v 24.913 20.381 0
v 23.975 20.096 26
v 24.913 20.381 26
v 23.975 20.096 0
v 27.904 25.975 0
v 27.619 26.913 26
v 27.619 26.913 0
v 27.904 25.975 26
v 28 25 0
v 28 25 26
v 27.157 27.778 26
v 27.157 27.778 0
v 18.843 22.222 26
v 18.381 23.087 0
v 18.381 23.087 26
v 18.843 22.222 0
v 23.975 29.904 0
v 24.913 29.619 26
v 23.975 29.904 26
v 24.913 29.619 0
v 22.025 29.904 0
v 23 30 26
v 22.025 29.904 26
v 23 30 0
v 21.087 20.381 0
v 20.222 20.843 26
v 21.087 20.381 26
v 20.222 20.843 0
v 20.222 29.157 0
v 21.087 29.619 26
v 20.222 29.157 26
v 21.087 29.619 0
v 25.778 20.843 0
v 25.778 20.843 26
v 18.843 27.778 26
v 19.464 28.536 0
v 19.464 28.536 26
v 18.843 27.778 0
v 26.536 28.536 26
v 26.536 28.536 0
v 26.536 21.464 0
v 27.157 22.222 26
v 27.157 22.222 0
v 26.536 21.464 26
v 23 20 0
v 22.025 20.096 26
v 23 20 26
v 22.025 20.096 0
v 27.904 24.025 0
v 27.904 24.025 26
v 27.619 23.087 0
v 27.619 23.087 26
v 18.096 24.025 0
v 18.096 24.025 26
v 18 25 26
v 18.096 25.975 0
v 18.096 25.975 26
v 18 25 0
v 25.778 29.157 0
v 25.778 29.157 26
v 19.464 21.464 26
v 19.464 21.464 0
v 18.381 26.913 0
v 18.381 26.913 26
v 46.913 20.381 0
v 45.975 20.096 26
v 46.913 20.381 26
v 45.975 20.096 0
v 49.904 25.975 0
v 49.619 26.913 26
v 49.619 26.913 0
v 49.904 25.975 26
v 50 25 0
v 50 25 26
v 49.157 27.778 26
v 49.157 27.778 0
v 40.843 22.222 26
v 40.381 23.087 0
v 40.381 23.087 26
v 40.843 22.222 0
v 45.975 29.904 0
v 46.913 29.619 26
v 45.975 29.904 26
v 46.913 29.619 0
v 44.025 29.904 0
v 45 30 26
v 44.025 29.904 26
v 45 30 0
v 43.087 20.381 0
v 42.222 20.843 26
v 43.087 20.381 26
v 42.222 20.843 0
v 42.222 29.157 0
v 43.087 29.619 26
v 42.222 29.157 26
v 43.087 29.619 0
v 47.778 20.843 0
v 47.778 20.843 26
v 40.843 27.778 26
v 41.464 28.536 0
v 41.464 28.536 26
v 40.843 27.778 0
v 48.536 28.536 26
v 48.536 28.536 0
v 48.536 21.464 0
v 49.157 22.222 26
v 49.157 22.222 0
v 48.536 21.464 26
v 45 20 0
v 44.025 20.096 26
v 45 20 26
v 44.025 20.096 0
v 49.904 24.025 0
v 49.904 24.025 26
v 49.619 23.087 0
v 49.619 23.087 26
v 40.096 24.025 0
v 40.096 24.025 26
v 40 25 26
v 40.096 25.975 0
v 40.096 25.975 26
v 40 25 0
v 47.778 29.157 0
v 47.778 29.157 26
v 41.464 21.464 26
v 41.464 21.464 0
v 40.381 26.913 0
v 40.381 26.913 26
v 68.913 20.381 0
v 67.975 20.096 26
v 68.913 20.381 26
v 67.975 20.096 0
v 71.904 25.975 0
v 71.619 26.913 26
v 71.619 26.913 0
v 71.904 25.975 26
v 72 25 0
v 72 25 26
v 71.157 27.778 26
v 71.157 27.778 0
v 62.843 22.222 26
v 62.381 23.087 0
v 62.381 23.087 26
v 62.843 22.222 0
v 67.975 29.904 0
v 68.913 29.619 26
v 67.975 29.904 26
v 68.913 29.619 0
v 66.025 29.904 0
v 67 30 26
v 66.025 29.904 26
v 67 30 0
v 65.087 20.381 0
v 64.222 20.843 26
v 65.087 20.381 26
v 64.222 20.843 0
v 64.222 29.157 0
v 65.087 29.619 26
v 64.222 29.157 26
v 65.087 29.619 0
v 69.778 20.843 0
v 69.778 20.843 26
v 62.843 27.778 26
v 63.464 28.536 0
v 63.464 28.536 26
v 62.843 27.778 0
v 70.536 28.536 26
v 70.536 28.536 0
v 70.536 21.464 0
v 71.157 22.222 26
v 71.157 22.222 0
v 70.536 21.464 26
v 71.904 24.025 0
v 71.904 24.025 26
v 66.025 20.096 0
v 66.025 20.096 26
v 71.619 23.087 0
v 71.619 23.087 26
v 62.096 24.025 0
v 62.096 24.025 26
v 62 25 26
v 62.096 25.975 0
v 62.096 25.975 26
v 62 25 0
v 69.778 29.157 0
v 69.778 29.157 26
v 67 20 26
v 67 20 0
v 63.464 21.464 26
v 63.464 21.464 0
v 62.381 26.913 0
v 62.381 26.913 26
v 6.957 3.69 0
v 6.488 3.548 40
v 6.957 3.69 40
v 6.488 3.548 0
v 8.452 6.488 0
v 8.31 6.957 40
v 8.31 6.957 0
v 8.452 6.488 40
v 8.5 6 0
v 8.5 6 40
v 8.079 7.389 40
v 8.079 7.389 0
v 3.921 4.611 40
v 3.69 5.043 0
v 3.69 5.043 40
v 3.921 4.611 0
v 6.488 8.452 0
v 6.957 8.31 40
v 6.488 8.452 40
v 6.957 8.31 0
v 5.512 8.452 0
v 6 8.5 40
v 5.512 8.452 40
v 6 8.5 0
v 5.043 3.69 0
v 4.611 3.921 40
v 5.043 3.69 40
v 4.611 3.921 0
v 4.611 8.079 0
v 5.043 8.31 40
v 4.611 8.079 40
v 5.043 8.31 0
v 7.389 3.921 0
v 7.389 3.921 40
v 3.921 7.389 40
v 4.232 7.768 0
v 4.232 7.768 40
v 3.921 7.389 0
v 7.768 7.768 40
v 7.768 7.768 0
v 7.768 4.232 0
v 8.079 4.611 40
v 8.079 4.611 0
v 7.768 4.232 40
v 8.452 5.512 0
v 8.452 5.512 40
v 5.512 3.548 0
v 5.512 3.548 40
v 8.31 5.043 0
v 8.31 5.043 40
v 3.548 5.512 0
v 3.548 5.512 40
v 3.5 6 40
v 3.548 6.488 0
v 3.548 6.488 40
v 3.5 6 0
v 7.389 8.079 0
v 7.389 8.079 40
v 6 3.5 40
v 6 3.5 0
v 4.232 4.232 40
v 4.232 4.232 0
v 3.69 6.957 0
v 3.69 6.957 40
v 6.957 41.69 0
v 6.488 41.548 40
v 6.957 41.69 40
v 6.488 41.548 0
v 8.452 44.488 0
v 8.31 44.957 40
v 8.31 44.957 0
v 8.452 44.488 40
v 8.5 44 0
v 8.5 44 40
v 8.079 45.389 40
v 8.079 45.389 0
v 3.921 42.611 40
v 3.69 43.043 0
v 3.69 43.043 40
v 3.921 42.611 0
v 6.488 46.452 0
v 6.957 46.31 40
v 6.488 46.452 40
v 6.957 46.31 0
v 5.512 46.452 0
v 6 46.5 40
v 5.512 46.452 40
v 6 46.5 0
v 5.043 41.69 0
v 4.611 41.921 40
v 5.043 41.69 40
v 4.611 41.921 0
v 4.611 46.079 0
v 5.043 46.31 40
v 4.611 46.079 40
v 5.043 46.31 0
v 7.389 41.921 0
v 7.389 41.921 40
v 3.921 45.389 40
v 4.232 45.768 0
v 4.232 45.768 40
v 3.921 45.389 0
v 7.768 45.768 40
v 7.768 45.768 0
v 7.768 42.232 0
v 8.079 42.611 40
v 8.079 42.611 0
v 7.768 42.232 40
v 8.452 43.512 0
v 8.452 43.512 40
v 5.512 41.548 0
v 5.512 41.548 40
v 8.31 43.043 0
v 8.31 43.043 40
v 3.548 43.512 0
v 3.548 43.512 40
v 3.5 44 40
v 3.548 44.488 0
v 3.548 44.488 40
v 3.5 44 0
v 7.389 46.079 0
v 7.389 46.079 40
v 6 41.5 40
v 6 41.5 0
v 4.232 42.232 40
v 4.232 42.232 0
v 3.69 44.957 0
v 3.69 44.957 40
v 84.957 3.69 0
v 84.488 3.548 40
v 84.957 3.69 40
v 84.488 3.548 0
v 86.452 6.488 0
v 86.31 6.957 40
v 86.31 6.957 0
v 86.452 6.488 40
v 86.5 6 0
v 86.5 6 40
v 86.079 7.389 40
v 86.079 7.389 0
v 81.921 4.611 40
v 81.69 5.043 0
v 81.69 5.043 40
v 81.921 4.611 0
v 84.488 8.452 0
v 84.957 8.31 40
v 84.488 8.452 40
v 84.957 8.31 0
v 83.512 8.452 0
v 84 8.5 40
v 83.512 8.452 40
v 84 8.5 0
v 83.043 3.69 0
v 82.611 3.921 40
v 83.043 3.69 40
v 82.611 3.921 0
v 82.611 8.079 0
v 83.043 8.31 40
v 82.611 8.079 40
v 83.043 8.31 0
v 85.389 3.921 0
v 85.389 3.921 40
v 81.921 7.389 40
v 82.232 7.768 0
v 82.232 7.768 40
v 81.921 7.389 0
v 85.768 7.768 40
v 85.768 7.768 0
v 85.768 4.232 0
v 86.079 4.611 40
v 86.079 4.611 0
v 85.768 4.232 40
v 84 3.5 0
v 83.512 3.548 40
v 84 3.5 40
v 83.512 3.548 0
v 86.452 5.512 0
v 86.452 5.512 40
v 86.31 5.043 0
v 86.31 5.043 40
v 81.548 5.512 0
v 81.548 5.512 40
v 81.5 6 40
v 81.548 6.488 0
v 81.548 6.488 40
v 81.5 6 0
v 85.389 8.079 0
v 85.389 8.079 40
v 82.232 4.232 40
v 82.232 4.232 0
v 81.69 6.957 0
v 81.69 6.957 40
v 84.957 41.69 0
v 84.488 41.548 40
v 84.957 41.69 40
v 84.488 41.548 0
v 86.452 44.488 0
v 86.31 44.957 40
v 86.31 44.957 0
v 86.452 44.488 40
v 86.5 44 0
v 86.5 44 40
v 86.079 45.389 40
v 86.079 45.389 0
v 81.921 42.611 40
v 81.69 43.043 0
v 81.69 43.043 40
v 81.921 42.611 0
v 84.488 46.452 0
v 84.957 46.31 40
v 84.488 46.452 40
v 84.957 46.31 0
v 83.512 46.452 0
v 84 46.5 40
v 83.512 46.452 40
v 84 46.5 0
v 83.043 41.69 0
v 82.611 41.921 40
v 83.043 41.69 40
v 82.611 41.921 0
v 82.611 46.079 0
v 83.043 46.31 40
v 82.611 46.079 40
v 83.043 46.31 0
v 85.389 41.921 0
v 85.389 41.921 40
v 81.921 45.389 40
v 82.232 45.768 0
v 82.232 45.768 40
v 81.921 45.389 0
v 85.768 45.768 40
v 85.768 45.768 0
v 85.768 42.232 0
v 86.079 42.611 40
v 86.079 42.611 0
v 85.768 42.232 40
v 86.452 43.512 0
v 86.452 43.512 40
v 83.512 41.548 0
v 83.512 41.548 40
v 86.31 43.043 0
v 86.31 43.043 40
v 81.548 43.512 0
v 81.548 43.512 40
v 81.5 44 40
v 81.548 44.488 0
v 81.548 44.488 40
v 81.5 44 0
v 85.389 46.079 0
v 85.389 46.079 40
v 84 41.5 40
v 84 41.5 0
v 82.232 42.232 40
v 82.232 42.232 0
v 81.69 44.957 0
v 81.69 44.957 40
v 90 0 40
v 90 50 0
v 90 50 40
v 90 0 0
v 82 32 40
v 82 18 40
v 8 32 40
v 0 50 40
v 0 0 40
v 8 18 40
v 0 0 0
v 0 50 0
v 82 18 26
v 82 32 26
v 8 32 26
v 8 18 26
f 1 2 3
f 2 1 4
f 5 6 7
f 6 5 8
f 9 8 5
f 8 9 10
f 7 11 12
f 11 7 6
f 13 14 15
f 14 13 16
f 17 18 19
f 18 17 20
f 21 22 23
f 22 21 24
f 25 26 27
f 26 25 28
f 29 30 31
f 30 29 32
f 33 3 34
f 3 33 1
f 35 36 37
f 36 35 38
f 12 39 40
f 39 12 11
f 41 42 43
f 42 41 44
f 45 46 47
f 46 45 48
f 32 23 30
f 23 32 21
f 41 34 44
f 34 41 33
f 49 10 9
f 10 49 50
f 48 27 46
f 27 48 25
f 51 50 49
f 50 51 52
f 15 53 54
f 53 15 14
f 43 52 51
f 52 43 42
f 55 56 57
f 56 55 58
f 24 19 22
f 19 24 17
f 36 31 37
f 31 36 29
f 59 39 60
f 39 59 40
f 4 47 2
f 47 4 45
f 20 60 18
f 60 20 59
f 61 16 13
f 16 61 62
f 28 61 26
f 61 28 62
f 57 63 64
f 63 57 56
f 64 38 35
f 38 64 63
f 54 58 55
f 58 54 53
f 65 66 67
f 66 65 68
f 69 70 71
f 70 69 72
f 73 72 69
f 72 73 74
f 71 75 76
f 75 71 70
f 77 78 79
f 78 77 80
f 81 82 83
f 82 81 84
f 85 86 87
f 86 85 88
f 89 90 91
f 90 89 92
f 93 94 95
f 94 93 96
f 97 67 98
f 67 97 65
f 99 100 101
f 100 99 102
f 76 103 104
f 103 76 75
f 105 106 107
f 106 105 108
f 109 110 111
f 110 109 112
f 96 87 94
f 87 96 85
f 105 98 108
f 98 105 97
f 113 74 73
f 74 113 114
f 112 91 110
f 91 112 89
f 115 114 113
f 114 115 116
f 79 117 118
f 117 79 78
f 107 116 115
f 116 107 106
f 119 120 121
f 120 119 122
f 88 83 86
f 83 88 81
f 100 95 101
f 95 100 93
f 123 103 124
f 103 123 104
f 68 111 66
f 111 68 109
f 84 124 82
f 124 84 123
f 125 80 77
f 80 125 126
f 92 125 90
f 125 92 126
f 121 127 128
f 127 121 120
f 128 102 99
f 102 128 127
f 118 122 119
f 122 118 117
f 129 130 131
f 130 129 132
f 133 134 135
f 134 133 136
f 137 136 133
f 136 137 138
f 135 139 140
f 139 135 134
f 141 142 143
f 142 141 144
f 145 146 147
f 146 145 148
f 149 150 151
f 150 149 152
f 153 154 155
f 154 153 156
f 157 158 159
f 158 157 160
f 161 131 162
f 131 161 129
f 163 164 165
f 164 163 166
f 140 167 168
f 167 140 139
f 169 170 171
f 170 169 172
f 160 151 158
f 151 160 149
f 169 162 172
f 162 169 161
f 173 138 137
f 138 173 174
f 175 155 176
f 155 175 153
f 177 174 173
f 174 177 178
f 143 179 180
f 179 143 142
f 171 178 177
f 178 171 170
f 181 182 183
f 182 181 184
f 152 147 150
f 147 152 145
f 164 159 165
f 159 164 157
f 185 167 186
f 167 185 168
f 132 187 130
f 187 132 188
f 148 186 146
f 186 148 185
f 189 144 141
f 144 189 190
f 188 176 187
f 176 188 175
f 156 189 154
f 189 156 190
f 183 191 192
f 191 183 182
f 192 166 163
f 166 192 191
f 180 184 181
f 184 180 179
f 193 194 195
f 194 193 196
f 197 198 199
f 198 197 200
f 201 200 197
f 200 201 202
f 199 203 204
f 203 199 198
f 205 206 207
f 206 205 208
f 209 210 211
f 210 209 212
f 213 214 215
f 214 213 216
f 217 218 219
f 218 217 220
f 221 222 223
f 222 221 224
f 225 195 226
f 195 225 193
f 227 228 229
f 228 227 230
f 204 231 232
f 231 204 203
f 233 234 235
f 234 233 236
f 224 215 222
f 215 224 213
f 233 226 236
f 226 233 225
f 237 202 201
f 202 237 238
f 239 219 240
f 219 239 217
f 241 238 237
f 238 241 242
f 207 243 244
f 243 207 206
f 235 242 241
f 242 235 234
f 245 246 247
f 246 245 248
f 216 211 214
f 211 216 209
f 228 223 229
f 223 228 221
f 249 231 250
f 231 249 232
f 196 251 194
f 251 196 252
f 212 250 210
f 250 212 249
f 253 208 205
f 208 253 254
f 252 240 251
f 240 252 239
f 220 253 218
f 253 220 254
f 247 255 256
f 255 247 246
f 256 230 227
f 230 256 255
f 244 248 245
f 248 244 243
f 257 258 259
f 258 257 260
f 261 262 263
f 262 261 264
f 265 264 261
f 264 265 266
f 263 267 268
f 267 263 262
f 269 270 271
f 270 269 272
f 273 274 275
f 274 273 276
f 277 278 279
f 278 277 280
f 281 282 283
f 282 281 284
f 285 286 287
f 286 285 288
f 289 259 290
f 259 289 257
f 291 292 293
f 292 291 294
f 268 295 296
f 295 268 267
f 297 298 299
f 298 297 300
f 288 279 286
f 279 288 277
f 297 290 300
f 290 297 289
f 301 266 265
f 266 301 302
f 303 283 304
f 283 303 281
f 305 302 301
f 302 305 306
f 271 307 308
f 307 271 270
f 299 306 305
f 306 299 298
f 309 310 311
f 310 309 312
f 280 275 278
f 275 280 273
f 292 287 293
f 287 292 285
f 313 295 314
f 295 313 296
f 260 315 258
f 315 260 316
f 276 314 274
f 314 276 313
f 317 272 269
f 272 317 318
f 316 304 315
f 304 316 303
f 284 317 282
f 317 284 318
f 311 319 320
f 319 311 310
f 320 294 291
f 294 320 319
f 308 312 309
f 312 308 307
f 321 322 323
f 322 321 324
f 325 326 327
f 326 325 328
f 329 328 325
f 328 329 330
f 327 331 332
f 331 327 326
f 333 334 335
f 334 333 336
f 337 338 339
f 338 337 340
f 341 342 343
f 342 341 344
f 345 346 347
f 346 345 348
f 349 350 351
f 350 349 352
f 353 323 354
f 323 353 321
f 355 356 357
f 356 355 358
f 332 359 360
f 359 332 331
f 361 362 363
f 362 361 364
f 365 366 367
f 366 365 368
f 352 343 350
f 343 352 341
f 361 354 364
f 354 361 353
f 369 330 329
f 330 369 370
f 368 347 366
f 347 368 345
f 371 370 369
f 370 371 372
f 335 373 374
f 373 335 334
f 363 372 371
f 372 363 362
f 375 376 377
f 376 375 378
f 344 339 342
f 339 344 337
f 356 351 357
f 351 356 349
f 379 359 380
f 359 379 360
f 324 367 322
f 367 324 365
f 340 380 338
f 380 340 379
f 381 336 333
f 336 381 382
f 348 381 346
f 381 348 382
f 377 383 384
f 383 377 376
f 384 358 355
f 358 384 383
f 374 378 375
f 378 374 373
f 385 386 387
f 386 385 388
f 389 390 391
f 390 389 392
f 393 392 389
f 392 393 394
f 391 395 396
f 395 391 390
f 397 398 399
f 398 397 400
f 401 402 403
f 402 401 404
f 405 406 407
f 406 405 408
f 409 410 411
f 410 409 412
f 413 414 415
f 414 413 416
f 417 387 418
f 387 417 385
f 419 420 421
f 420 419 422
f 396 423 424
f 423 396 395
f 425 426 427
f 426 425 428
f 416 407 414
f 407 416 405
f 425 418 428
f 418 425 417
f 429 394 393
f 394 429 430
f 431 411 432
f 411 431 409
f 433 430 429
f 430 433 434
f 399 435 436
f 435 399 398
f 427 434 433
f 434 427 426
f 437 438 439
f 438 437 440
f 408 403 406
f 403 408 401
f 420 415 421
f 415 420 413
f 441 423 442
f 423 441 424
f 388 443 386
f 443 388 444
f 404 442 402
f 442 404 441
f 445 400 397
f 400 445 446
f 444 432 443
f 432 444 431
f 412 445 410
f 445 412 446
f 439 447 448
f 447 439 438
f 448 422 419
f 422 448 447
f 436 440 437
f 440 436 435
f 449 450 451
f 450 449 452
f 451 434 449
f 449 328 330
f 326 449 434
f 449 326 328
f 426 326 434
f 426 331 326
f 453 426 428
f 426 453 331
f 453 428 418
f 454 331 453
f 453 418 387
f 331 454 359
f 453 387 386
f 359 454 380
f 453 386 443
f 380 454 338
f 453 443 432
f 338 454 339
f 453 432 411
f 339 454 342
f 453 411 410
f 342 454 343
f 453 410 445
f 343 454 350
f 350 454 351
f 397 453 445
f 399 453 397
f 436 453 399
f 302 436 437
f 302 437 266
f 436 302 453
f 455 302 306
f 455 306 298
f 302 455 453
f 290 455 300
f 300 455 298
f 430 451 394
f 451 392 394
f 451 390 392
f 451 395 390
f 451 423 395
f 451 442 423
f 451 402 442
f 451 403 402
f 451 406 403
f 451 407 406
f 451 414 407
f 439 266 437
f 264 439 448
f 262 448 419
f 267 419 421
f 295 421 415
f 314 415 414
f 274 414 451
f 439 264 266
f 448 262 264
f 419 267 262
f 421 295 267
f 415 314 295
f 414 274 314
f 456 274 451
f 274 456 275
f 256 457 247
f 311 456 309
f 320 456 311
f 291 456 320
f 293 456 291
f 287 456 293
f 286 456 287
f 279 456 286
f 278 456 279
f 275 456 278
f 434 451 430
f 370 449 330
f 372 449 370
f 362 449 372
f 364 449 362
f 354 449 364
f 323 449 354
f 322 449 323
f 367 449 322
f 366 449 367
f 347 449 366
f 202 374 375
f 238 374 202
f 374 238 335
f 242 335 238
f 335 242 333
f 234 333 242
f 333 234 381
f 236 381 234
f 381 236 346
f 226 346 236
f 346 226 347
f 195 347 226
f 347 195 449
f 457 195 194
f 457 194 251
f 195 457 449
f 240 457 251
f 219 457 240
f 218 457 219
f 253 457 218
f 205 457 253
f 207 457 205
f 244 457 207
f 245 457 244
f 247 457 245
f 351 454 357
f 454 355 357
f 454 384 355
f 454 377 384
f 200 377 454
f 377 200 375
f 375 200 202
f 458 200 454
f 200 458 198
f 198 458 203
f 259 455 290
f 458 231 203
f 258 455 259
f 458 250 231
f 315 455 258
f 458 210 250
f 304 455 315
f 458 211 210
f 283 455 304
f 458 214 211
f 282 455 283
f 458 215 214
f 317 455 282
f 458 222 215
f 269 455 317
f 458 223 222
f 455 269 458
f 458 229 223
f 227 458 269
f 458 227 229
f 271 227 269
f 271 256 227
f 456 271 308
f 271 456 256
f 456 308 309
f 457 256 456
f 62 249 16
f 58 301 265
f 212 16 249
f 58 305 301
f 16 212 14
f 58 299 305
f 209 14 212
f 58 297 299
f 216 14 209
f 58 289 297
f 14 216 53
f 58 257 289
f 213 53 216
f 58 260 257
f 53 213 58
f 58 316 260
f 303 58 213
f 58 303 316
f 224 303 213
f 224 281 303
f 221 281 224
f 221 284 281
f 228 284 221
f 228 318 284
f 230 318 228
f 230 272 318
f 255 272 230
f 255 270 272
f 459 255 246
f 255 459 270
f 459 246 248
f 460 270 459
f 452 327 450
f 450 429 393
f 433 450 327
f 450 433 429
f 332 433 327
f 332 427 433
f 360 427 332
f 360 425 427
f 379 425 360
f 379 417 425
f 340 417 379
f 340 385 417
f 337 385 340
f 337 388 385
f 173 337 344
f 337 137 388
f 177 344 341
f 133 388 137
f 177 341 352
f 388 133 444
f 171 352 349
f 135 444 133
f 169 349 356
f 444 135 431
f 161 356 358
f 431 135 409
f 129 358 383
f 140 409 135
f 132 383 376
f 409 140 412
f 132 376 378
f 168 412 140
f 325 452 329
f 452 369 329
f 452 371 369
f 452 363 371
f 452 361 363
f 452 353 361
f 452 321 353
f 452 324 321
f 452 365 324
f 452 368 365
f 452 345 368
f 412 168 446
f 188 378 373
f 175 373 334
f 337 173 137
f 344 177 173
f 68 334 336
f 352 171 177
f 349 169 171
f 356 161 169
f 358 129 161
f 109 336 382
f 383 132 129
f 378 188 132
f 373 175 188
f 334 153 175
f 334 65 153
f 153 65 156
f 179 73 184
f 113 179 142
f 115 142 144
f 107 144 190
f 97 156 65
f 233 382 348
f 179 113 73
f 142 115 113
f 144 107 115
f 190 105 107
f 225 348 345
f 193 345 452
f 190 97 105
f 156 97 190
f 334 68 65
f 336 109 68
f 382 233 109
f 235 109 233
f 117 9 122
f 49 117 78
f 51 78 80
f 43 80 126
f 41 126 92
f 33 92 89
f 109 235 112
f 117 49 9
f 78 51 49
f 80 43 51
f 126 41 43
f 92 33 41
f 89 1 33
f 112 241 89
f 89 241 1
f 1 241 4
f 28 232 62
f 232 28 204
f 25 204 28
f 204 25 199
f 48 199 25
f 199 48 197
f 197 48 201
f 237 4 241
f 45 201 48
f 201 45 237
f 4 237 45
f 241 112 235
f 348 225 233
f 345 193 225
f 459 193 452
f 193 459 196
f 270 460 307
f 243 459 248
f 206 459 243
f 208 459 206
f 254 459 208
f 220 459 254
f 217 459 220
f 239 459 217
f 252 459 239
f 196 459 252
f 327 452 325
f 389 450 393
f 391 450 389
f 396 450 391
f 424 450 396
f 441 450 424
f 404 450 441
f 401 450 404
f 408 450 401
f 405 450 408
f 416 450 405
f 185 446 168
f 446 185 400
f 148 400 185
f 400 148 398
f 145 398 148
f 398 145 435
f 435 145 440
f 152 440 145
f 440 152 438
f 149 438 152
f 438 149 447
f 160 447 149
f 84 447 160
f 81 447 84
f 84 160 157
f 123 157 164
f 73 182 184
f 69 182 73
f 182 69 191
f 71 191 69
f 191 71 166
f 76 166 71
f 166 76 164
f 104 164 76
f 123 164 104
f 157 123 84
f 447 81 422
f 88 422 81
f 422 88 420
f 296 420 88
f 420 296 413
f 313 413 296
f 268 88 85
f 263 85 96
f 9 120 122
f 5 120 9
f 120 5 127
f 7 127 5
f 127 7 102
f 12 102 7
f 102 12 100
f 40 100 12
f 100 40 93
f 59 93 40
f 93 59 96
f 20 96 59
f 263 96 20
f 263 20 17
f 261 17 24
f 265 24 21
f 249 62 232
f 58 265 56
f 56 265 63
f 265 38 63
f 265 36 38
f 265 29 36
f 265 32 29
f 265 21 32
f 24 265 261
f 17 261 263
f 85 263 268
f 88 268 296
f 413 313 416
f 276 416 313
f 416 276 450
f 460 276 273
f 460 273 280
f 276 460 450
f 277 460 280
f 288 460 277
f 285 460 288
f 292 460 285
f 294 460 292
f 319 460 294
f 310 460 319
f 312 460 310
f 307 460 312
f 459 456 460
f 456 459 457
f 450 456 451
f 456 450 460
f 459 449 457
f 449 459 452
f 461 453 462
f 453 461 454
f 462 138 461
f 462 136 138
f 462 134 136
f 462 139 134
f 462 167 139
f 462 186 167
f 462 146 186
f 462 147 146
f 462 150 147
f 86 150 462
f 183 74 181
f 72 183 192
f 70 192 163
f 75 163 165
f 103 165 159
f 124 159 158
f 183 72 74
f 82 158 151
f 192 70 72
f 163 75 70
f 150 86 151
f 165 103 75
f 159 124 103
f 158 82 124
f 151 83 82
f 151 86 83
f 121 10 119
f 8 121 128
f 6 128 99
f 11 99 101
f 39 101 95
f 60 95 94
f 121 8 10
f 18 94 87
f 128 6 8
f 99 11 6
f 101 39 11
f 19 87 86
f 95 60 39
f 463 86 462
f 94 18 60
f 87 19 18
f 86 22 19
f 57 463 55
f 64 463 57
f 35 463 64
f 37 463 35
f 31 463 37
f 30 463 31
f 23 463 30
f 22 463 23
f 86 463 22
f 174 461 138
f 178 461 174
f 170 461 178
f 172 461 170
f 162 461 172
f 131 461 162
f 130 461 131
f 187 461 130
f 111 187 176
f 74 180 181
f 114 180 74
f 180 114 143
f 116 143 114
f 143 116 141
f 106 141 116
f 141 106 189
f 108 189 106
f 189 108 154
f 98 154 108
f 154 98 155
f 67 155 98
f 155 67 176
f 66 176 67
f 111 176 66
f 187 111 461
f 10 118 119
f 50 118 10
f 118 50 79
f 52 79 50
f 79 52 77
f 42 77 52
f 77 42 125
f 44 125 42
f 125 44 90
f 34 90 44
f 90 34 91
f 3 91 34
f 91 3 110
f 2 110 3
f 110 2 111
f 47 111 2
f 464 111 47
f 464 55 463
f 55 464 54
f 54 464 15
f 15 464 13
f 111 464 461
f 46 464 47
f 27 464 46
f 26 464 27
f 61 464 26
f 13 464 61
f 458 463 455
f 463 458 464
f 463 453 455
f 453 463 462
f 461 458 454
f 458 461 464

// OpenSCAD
$fn = 32;

// ----------------------------------------------------------------------
// Manifold block: gallery_top manifold
// ----------------------------------------------------------------------

// --- parameters (mm) ---
block_l = 90;             // block length, X
block_w = 50;             // block width, Y
block_h = 40;             // block height, Z
port_d = 10;              // port bore diameter
port_pitch = 22;          // port pitch along X
gallery_d = 14;           // top gallery width, Y
gallery_depth = 14;       // gallery pocket depth
wall_p = 8;               // gallery end wall thickness, X
mnt_d = 5;                // mounting hole diameter
mnt_in = 6;               // mounting hole inset from the edges

n_ports = 3;  // ports in the row
port_x0 = (block_l - (n_ports - 1) * port_pitch) / 2;  // first port X

difference() {
  cube([block_l, block_w, block_h]);
  for (i = [0 : n_ports - 1])
    translate([port_x0 + i * port_pitch, block_w / 2, -1])
      cylinder(h = block_h + 2, d = port_d);
  translate([wall_p, block_w / 2 - gallery_d / 2, block_h - gallery_depth])
    cube([block_l - 2 * wall_p, gallery_d, gallery_depth + 1]);
  for (cx = [mnt_in, block_l - mnt_in])
    for (cy = [mnt_in, block_w - mnt_in])
      translate([cx, cy, -1]) cylinder(h = block_h + 2, d = mnt_d);
}
